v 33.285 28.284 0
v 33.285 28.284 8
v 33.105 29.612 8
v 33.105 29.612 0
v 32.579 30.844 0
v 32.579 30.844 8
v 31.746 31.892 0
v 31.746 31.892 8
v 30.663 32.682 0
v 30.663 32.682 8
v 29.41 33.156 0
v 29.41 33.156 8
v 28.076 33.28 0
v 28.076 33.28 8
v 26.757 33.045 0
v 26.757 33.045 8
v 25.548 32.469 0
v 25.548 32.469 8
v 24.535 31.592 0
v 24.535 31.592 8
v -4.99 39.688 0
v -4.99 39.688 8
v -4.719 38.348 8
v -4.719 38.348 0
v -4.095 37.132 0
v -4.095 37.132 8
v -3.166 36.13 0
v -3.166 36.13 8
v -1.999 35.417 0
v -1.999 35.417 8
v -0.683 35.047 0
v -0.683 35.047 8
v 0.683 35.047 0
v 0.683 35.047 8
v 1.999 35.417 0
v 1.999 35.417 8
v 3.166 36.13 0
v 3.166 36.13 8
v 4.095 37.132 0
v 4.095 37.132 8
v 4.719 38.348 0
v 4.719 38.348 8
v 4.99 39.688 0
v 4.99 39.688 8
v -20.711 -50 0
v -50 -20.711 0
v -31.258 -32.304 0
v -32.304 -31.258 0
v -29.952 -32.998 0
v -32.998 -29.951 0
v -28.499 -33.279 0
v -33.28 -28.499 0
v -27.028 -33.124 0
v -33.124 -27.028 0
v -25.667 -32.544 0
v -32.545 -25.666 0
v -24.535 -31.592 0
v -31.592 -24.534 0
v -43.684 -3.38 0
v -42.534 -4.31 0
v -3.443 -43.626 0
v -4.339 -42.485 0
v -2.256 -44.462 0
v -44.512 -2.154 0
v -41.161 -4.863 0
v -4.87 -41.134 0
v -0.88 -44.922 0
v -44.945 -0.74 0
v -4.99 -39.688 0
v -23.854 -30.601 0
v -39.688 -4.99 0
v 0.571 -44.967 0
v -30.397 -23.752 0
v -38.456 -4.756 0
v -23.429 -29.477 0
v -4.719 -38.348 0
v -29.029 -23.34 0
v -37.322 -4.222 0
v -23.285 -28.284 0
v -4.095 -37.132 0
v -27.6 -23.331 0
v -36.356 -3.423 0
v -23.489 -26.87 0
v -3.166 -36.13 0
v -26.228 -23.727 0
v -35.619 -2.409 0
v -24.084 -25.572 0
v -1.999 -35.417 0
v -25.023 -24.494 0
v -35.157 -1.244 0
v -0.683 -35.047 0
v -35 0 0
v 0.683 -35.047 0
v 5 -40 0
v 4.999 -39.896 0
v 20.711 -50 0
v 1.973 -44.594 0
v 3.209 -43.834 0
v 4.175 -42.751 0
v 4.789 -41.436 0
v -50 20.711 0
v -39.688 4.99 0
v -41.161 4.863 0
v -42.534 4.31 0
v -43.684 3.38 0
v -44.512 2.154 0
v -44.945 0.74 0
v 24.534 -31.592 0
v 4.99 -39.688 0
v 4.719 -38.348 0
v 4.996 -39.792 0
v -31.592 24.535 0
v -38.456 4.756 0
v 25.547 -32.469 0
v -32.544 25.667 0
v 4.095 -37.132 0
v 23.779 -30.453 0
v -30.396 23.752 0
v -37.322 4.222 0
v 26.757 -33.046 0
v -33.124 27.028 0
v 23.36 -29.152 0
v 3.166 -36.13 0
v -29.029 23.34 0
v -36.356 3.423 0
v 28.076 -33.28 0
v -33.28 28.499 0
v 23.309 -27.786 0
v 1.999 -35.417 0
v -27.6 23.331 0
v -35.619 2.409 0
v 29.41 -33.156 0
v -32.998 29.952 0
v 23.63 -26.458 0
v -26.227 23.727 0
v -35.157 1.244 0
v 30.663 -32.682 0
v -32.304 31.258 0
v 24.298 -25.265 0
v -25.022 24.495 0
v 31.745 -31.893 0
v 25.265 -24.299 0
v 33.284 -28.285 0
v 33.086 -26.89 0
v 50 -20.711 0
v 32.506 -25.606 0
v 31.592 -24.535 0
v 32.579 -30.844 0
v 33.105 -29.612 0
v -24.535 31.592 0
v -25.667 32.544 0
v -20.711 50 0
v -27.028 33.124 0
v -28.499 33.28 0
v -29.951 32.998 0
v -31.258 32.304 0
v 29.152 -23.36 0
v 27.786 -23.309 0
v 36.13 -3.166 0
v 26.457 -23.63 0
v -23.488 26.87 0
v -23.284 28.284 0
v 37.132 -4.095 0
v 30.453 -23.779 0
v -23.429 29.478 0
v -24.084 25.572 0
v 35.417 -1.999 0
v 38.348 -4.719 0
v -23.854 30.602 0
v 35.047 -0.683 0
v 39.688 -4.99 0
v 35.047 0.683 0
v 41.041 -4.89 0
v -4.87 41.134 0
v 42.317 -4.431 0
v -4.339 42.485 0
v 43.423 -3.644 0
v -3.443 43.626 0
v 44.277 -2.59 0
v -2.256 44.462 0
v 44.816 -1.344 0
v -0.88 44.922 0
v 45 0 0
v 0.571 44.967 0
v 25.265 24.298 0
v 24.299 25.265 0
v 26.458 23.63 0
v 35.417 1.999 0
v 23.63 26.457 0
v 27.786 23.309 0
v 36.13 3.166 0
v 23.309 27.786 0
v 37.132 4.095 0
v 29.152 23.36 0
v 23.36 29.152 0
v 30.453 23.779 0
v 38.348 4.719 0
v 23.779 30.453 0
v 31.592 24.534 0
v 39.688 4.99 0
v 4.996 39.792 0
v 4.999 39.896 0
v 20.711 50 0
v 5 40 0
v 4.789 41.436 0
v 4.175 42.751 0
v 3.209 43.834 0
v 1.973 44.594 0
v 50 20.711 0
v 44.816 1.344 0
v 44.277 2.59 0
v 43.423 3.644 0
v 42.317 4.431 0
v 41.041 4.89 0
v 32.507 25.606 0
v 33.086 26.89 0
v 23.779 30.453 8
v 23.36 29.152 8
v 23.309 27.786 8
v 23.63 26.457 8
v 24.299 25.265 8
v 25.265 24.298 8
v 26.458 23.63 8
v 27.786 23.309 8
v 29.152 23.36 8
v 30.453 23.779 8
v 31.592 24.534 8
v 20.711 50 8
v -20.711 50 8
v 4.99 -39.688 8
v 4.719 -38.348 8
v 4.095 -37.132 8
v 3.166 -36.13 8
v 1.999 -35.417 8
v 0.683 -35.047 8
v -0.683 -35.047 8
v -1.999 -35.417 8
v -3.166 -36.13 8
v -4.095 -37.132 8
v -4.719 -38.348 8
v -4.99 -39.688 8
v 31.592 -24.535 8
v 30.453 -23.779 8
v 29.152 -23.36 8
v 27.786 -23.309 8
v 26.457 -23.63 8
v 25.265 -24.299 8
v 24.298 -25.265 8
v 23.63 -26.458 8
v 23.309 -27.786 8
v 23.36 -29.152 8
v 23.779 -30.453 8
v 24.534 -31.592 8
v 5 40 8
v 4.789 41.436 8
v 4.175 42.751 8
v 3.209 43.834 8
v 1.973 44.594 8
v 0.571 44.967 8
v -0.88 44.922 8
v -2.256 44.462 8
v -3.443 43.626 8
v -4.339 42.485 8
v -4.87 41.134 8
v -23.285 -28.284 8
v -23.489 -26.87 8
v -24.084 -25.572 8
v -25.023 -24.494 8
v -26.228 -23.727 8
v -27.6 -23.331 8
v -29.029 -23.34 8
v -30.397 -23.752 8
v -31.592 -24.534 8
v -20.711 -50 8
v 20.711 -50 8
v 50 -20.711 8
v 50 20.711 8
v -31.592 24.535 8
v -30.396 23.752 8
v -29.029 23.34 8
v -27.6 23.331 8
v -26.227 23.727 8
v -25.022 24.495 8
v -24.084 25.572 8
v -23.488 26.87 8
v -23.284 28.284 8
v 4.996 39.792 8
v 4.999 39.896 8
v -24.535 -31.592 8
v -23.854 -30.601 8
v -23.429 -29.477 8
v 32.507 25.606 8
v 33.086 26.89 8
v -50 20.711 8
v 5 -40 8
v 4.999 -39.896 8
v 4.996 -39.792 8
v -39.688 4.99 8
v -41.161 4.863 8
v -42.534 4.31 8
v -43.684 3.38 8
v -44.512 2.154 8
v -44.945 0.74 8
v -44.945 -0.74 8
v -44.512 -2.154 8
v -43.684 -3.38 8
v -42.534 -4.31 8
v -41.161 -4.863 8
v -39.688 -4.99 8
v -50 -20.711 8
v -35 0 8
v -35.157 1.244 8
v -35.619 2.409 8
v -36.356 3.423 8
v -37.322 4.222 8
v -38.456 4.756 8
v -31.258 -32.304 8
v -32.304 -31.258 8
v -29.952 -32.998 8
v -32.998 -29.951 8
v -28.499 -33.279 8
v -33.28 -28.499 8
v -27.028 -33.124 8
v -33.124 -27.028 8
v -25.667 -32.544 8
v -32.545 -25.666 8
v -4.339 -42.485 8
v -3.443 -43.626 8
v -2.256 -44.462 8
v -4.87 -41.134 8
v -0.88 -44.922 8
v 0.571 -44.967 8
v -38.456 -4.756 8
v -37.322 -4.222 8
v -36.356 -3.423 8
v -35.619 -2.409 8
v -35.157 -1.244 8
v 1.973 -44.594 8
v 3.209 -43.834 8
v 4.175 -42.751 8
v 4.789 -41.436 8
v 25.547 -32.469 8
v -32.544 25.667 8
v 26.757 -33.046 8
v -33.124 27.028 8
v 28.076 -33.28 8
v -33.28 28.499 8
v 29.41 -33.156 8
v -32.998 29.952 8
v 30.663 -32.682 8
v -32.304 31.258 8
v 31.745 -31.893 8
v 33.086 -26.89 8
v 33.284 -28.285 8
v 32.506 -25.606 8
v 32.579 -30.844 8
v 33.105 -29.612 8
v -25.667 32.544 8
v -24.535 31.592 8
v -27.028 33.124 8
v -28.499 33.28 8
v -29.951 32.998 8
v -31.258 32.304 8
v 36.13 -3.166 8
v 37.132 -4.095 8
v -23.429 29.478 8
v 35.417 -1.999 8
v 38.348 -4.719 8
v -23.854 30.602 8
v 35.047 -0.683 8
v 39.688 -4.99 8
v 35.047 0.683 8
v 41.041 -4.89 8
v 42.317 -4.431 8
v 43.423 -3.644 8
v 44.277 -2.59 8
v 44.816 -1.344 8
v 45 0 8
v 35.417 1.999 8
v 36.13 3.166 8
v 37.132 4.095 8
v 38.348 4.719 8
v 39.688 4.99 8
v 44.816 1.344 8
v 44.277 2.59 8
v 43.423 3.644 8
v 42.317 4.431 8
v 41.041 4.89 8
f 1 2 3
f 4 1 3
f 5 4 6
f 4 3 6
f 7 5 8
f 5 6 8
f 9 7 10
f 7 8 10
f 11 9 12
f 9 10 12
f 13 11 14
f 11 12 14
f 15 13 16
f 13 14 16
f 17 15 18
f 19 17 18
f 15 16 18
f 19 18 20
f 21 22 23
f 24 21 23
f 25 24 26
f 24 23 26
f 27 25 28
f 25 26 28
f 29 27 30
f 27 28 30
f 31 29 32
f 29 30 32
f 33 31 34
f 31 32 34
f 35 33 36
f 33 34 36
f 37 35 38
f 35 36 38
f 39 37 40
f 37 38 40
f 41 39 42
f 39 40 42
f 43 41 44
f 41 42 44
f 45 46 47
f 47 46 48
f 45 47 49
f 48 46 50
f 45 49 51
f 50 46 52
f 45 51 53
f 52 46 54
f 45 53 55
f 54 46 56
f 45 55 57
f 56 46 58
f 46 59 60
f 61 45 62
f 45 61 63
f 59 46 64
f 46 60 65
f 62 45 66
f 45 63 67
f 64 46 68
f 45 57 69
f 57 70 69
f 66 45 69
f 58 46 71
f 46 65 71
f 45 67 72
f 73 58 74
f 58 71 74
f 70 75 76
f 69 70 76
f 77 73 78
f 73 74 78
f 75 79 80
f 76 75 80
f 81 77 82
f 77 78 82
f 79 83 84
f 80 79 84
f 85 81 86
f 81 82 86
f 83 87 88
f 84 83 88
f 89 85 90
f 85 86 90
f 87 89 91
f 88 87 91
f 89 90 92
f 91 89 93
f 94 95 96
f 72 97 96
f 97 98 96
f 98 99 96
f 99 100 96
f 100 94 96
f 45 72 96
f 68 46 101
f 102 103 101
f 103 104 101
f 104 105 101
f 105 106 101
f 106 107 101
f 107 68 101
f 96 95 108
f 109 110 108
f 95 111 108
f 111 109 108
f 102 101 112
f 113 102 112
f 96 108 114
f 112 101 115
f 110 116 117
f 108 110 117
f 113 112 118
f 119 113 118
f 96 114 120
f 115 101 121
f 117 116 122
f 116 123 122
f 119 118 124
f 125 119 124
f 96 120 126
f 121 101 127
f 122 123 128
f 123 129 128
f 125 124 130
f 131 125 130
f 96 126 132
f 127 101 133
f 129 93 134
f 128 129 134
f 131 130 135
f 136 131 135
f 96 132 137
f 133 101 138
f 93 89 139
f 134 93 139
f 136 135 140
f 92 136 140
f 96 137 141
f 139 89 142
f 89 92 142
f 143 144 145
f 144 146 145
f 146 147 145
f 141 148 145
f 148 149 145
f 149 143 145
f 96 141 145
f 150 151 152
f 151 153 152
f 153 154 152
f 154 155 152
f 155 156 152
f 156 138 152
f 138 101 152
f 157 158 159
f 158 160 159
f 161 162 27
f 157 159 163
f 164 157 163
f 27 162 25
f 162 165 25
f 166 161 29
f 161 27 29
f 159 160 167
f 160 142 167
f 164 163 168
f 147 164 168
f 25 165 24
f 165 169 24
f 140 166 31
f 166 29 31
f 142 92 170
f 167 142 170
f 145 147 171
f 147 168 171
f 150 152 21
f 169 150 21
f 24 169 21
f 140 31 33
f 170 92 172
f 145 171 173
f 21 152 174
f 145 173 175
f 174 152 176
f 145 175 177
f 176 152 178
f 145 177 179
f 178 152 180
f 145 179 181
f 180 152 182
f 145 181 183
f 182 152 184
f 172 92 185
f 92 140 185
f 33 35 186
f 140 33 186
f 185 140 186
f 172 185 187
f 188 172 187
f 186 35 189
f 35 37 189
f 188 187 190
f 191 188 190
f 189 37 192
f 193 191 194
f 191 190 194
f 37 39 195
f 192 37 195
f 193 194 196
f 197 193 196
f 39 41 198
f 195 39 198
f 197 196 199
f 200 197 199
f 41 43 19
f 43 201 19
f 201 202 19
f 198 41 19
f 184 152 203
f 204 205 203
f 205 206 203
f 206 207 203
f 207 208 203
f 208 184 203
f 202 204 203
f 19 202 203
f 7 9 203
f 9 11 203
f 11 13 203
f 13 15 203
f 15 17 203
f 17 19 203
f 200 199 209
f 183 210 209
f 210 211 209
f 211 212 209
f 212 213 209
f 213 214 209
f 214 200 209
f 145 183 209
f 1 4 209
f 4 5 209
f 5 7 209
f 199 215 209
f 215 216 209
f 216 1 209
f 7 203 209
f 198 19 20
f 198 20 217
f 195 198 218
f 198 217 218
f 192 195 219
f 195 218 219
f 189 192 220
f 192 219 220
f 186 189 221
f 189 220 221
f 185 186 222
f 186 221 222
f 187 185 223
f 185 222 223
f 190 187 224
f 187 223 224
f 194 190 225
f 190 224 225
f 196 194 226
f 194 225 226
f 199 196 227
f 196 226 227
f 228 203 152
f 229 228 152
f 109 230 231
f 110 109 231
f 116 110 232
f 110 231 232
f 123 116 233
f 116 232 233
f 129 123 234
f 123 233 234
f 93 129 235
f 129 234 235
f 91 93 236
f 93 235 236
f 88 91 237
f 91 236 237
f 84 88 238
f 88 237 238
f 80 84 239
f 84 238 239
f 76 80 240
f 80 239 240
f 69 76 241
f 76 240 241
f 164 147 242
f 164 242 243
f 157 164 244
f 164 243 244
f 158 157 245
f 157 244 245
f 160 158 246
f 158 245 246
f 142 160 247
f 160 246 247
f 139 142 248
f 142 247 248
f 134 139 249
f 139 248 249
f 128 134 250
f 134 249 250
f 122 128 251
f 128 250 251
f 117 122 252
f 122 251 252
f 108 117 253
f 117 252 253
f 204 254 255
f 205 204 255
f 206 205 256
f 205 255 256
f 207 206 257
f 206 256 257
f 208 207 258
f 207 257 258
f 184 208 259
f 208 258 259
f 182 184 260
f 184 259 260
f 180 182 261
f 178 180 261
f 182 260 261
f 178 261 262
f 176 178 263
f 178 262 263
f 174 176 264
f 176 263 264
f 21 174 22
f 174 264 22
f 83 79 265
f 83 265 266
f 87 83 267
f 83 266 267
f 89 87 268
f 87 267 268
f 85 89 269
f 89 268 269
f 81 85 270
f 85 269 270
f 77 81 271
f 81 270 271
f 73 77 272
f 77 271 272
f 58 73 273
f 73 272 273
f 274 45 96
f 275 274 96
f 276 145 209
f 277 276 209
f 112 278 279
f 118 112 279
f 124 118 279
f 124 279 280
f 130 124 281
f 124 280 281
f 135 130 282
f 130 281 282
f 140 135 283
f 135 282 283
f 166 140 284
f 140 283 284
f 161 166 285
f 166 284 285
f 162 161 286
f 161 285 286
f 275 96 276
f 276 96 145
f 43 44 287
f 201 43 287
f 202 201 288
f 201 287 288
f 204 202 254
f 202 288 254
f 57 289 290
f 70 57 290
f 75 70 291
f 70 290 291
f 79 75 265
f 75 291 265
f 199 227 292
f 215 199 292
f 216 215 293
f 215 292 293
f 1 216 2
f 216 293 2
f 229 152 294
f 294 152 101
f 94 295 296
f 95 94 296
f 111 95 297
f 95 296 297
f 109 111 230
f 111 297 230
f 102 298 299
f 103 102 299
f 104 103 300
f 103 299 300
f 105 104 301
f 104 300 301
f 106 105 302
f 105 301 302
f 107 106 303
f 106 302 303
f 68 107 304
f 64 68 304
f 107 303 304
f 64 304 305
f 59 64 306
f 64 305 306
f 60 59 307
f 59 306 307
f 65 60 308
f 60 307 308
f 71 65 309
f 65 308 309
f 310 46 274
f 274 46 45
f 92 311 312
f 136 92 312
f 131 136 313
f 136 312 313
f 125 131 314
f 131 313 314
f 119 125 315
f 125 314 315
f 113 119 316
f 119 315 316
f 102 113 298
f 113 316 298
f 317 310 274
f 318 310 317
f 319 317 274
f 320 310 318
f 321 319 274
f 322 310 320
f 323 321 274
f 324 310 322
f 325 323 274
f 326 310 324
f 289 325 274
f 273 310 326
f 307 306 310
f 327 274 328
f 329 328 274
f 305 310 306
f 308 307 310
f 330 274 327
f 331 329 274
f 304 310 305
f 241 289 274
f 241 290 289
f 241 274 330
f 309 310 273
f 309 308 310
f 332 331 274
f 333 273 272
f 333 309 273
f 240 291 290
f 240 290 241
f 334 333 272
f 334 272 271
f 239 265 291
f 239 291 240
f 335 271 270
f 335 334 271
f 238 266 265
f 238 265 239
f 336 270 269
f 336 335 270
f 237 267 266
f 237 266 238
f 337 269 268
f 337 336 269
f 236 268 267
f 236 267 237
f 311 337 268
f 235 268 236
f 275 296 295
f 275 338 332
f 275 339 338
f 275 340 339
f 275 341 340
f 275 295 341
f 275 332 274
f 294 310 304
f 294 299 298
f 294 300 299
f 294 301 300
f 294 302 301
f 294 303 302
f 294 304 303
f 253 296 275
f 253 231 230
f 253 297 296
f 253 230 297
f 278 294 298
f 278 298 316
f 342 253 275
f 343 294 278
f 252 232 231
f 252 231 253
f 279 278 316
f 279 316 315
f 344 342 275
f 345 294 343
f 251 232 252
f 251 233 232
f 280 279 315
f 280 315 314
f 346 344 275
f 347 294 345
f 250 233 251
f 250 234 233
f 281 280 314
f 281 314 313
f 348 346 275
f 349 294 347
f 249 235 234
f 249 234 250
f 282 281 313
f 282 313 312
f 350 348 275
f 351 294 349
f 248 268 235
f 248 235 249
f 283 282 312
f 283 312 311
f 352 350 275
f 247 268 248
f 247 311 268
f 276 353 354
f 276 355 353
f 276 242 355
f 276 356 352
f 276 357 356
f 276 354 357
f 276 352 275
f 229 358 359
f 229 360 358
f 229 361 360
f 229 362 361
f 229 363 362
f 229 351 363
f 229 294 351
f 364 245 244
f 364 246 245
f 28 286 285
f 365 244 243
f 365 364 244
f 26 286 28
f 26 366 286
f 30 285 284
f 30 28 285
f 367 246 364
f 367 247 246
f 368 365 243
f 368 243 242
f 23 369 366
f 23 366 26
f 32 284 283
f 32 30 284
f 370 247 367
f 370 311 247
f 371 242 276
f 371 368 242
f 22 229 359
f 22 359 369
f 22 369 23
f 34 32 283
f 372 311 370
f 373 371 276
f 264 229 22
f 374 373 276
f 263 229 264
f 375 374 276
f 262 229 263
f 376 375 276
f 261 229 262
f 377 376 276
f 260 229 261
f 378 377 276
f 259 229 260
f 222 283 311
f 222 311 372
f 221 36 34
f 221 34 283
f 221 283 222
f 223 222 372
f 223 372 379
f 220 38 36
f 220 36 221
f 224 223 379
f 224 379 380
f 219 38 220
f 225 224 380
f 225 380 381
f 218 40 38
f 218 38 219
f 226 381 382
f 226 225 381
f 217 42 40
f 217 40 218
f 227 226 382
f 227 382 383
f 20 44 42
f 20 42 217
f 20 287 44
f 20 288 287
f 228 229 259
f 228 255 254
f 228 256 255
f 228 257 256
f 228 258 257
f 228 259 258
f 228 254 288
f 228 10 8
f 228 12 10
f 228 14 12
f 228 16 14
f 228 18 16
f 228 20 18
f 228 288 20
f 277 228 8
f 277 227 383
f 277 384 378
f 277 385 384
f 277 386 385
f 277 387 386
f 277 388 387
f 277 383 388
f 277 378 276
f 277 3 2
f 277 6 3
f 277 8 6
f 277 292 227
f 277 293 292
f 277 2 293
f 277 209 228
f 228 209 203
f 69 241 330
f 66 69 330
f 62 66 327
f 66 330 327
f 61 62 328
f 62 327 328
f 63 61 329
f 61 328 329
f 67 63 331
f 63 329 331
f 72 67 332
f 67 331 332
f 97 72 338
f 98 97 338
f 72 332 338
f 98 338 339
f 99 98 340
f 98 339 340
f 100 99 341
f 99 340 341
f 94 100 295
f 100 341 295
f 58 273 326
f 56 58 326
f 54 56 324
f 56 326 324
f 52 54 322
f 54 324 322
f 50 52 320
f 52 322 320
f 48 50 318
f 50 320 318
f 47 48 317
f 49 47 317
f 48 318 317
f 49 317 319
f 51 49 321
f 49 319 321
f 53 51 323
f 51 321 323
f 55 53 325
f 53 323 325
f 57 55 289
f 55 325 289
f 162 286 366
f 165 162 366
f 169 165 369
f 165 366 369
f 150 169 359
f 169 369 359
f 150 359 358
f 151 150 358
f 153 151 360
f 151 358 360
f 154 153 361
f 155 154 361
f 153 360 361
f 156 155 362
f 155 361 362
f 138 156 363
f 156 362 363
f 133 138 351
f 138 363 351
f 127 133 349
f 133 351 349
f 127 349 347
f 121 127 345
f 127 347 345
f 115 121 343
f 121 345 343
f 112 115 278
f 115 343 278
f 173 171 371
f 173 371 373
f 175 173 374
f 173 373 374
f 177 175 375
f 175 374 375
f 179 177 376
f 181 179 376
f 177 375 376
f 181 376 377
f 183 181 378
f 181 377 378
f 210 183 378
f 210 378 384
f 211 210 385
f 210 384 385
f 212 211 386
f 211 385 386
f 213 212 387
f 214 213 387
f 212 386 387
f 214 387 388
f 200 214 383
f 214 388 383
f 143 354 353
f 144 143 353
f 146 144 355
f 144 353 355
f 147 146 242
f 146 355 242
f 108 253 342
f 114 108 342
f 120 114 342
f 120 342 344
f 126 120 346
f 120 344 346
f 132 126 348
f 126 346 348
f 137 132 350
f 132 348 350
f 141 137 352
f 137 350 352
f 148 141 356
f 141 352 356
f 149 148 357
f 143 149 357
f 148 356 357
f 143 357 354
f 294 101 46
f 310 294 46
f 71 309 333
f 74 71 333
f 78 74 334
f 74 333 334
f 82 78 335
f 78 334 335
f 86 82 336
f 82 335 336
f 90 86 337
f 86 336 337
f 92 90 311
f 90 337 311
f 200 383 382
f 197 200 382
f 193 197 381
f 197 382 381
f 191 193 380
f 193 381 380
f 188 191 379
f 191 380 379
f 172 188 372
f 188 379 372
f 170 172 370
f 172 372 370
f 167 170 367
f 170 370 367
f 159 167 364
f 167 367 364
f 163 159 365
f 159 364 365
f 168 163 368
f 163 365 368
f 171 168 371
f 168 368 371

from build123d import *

# Parameters (mm, degrees)
F1_DEPTH = 8
F3_DEPTH = 25


with BuildPart() as f1:
    # F0 (on Top) → F1 (new body)
    with BuildSketch(Plane.XY):
        Polygon((20.7106781187, -50), (50, -20.7106781187), (50, 20.7106781187), (20.7106781187, 50), (-20.7106781187, 50), (-50, 20.7106781187), (-50, -20.7106781187), (-20.7106781187, -50), align=None)
    extrude(amount=F1_DEPTH)

    # F2 (on face) → F3 (cut)
    with BuildSketch(Plane.XY.offset(8)):
        with BuildLine():
            ThreePointArc((24.5349567524, 31.5917061451), (24.7489552671, 24.7485194141), (31.5921382283, 24.5344003832))
            ThreePointArc((31.5921382283, 24.5344003832), (28.2845203052, 28.2840221875), (24.5349567524, 31.5917061451))
        make_face()
        with BuildLine():
            ThreePointArc((24.5349567524, 31.5917061451), (28.2845203052, 28.2840221875), (31.5921382283, 24.5344003832))
            ThreePointArc((31.5921382283, 24.5344003832), (32.8418270546, 26.2270936053), (33.2845203052, 28.2840221875))
            ThreePointArc((33.2845203052, 28.2840221875), (30.052595846, 32.9609772741), (24.5349567524, 31.5917061451))
        make_face()
        with BuildLine():
            ThreePointArc((-4.9902248196, 39.6875), (0, 35), (4.9902248196, 39.6875))
            ThreePointArc((4.9902248196, 39.6875), (0, 40), (-4.9902248196, 39.6875))
        make_face()
        with BuildLine():
            ThreePointArc((-4.9902248196, 39.6875), (0, 40), (4.9902248196, 39.6875))
            ThreePointArc((4.9902248196, 39.6875), (4.9975556074, 39.8436735754), (5, 40))
            ThreePointArc((5, 40), (-0.1563264246, 44.9975556074), (-4.9902248196, 39.6875))
        make_face()
        with BuildLine():
            ThreePointArc((-31.5918062772, 24.5348278197), (-28.2841376224, 28.2844048719), (-24.5345293173, 31.5920380979))
            ThreePointArc((-24.5345293173, 31.5920380979), (-31.8196548252, 31.8199554809), (-31.5918062772, 24.5348278197))
        make_face()
        with BuildLine():
            ThreePointArc((-23.2841376224, 28.2844048719), (-23.607170575, 30.0524487732), (-24.5345293173, 31.5920380979))
            ThreePointArc((-24.5345293173, 31.5920380979), (-28.2841376224, 28.2844048719), (-31.5918062772, 24.5348278197))
            ThreePointArc((-31.5918062772, 24.5348278197), (-26.2272398702, 23.7270842076), (-23.2841376224, 28.2844048719))
        make_face()
        with BuildLine():
            ThreePointArc((-39.6875, -4.9902248196), (-40, 0), (-39.6875, 4.9902248196))
            ThreePointArc((-39.6875, 4.9902248196), (-45, 0), (-39.6875, -4.9902248196))
        make_face()
        with BuildLine():
            ThreePointArc((-35, 0), (-36.3556550657, 3.4232659844), (-39.6875, 4.9902248196))
            ThreePointArc((-39.6875, 4.9902248196), (-40, 0), (-39.6875, -4.9902248196))
            ThreePointArc((-39.6875, -4.9902248196), (-36.3556550657, -3.4232659844), (-35, 0))
        make_face()
        with BuildLine():
            ThreePointArc((-31.5921382283, -24.5344003832), (-31.8200853434, -31.8195249609), (-24.5349567524, -31.5917061451))
            ThreePointArc((-24.5349567524, -31.5917061451), (-28.2845203052, -28.2840221875), (-31.5921382283, -24.5344003832))
        make_face()
        with BuildLine():
            ThreePointArc((-31.5921382283, -24.5344003832), (-28.2845203052, -28.2840221875), (-24.5349567524, -31.5917061451))
            ThreePointArc((-24.5349567524, -31.5917061451), (-23.6075652186, -30.0520977283), (-23.2845203052, -28.2840221875))
            ThreePointArc((-23.2845203052, -28.2840221875), (-26.227591723, -23.7267154382), (-31.5921382283, -24.5344003832))
        make_face()
        with BuildLine():
            ThreePointArc((-4.9902248196, -39.6875), (0, -40), (4.9902248196, -39.6875))
            ThreePointArc((4.9902248196, -39.6875), (0, -35), (-4.9902248196, -39.6875))
        make_face()
        with BuildLine():
            ThreePointArc((5, -40), (4.9975556074, -39.8436735754), (4.9902248196, -39.6875))
            ThreePointArc((4.9902248196, -39.6875), (0, -40), (-4.9902248196, -39.6875))
            ThreePointArc((-4.9902248196, -39.6875), (-0.1563264246, -44.9975556074), (5, -40))
        make_face()
        with BuildLine():
            ThreePointArc((24.5344003832, -31.5921382283), (28.2840221875, -28.2845203052), (31.5917061451, -24.5349567524))
            ThreePointArc((31.5917061451, -24.5349567524), (24.7485194141, -24.7489552671), (24.5344003832, -31.5921382283))
        make_face()
        with BuildLine():
            ThreePointArc((33.2840221875, -28.2845203052), (32.8413470491, -26.2276318527), (31.5917061451, -24.5349567524))
            ThreePointArc((31.5917061451, -24.5349567524), (28.2840221875, -28.2845203052), (24.5344003832, -31.5921382283))
            ThreePointArc((24.5344003832, -31.5921382283), (30.052056545, -32.9614909605), (33.2840221875, -28.2845203052))
        make_face()
        with BuildLine():
            ThreePointArc((39.6875, -4.9902248196), (39.9217985567, -2.5), (40, 0))
            ThreePointArc((40, 0), (39.9217985567, 2.5), (39.6875, 4.9902248196))
            ThreePointArc((39.6875, 4.9902248196), (35, 0), (39.6875, -4.9902248196))
        make_face()
        with BuildLine():
            ThreePointArc((39.6875, 4.9902248196), (39.9217985567, 2.5), (40, 0))
            ThreePointArc((40, 0), (39.9217985567, -2.5), (39.6875, -4.9902248196))
            ThreePointArc((39.6875, -4.9902248196), (43.4232659844, -3.6443449343), (45, 0))
            ThreePointArc((45, 0), (43.4232659844, 3.6443449343), (39.6875, 4.9902248196))
        make_face()
    extrude(amount=-F3_DEPTH, mode=Mode.SUBTRACT)


solid = f1.part
